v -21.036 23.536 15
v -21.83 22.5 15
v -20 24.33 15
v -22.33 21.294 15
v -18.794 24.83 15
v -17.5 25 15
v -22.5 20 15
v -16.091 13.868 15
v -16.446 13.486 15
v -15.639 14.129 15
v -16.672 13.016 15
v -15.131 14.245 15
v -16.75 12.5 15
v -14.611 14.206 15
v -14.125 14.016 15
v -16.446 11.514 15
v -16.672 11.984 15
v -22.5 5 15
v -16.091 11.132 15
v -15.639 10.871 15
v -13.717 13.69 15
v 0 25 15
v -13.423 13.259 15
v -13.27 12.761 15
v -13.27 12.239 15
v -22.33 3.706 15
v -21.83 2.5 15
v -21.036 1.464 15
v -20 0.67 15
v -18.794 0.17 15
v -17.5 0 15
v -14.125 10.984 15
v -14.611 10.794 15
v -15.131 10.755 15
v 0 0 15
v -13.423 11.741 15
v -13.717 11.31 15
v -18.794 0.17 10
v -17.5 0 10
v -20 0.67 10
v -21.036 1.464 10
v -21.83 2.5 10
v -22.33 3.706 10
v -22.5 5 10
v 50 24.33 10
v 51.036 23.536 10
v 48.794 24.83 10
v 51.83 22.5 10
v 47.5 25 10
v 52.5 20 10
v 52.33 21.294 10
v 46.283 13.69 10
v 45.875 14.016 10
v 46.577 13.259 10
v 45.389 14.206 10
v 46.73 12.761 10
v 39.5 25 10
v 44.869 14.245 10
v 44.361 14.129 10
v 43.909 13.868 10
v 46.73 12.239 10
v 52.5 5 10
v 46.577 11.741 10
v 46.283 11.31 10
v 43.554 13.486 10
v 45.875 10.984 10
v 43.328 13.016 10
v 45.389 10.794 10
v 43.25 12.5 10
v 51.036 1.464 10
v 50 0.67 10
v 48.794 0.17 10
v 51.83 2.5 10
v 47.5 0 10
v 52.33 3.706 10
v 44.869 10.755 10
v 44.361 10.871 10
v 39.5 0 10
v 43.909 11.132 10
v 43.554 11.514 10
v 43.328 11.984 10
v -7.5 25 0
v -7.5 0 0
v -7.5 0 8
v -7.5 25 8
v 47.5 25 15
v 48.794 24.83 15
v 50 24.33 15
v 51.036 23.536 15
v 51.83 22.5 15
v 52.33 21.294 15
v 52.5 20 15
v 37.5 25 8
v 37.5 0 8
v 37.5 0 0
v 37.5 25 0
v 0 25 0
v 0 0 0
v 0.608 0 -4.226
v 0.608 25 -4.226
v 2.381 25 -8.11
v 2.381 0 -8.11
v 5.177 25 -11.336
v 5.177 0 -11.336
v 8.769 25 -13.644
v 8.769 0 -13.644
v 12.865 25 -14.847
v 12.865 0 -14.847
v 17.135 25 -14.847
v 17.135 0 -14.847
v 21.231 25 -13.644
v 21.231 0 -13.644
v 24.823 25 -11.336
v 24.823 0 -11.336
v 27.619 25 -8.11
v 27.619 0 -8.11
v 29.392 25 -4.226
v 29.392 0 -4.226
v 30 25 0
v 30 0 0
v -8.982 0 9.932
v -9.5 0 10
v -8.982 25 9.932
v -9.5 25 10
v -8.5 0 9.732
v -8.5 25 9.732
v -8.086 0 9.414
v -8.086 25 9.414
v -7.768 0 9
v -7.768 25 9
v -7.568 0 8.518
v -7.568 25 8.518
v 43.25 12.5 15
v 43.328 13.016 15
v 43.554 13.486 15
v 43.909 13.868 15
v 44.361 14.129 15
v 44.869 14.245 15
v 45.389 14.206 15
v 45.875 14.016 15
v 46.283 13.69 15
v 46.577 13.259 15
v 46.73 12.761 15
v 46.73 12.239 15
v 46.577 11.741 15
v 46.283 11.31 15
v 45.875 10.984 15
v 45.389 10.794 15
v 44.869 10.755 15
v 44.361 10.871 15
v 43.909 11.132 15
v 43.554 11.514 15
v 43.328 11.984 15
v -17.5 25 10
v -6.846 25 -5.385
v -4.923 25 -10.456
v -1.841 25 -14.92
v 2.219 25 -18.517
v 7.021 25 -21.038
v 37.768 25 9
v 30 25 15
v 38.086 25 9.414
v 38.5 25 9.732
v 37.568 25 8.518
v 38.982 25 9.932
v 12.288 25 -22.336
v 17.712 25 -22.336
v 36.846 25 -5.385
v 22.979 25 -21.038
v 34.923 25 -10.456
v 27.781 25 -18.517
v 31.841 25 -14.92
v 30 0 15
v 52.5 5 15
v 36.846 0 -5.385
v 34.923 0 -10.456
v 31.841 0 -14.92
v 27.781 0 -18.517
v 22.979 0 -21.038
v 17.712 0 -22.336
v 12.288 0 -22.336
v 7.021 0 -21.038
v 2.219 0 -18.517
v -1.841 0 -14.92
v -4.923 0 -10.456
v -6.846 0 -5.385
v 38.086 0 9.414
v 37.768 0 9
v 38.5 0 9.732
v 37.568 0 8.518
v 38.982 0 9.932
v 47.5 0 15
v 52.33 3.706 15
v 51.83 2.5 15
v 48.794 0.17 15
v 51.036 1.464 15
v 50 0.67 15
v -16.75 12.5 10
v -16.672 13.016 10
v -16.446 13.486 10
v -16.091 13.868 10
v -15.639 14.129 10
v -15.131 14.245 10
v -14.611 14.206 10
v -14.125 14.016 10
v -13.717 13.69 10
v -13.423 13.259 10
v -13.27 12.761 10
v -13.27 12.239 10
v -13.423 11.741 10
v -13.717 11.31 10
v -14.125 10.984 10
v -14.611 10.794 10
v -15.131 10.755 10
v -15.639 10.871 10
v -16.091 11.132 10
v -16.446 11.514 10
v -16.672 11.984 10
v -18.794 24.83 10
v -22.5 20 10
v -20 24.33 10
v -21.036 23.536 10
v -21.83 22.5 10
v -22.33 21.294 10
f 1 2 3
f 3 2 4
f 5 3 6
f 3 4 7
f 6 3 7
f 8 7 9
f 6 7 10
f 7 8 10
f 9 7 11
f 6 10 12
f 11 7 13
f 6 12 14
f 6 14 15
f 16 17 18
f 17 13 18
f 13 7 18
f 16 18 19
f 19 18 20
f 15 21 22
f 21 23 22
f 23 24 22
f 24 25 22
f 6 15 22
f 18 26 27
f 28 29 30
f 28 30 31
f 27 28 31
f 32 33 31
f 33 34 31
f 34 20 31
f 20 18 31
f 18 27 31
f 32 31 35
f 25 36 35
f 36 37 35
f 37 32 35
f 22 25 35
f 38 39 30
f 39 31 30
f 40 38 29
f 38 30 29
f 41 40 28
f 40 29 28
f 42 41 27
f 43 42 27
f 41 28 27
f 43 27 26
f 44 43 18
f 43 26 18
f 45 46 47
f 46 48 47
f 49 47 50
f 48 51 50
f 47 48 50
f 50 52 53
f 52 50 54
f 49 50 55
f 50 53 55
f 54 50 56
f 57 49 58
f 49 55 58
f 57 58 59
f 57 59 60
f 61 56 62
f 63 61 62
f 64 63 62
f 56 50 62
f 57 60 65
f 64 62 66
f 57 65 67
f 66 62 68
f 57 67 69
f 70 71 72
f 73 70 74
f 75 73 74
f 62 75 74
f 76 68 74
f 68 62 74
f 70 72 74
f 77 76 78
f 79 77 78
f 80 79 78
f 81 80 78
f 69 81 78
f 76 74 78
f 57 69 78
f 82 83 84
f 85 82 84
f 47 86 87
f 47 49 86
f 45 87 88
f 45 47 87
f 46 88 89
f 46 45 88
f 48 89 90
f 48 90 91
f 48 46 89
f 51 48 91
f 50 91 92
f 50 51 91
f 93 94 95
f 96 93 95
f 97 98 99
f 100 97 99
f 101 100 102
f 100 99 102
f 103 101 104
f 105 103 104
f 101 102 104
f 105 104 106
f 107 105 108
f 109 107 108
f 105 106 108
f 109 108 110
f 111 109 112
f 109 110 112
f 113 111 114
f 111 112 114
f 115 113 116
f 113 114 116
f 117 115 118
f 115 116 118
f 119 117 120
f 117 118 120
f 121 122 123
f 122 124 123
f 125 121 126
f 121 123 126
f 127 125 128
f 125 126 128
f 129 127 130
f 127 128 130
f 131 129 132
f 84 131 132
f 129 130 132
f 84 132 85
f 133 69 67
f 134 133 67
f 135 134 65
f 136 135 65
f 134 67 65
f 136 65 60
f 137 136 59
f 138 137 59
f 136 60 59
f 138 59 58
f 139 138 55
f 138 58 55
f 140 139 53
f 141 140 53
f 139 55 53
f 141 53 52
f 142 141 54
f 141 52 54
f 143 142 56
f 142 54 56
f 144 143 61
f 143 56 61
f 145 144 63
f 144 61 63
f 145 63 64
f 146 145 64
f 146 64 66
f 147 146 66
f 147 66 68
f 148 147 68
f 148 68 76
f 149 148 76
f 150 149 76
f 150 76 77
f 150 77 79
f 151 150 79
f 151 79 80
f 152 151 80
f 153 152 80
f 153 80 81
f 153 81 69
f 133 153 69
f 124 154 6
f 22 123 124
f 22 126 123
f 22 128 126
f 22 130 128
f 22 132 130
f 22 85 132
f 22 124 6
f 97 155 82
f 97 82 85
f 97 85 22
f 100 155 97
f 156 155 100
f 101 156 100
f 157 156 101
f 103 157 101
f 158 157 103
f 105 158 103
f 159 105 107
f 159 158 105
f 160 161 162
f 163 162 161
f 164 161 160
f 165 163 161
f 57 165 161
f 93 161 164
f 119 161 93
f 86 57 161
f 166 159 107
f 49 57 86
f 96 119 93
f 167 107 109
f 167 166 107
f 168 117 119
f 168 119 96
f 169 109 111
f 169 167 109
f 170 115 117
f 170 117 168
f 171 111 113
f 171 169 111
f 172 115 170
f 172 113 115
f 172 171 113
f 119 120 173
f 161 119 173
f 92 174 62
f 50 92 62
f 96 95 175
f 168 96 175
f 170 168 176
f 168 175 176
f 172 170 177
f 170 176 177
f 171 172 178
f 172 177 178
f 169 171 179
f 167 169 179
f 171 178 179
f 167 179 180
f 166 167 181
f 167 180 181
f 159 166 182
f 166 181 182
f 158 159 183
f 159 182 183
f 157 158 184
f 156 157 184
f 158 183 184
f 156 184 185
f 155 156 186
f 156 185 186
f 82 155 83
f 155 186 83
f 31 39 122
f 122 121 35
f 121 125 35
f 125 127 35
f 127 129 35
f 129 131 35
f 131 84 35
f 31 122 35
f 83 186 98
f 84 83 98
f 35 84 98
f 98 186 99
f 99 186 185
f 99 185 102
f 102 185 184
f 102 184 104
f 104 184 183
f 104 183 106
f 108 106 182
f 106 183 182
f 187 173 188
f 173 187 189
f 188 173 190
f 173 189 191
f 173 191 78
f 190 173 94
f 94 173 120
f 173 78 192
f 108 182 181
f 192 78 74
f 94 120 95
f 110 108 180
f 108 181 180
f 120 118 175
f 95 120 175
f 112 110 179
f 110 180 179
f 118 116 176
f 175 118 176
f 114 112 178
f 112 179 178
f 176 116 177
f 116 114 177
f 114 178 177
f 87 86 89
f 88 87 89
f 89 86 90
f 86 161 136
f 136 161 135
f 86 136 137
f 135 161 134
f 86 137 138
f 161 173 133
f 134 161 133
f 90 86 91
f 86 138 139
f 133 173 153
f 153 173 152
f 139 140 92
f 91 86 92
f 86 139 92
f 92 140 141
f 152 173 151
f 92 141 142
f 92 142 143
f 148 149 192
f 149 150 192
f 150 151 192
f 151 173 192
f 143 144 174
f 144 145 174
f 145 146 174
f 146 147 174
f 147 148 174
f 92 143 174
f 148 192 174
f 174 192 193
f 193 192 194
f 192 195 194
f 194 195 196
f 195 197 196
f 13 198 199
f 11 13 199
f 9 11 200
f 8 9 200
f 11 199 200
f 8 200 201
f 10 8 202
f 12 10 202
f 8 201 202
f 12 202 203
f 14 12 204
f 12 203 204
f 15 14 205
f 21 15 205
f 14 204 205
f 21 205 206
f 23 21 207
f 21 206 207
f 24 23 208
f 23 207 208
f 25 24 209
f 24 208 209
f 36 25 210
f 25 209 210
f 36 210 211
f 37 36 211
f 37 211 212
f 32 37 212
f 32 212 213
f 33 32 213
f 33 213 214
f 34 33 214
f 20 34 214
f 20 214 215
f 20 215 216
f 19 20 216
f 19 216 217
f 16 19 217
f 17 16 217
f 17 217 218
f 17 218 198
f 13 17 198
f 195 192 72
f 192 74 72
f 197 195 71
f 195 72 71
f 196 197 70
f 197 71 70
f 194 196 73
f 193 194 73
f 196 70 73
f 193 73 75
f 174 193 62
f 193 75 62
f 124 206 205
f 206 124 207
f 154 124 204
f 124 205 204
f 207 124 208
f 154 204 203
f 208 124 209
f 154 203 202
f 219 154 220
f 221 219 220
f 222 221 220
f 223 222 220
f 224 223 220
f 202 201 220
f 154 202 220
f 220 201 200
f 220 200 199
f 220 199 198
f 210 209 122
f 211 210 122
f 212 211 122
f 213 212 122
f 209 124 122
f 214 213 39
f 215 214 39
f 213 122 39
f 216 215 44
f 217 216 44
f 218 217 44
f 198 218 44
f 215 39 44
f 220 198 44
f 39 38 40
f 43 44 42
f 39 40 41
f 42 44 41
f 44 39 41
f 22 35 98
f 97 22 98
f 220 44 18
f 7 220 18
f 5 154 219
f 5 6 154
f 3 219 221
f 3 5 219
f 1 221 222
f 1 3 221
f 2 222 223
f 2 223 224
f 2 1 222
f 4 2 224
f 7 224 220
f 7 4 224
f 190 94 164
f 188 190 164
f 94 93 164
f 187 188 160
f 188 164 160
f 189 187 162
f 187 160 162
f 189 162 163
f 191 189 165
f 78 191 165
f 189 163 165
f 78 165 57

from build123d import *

# Parameters (mm, degrees)
BOSS_EXTRUDE1_DEPTH = 25
SKETCH4_R           = 1.75
CUT_EXTRUDE1_DEPTH  = 6
FILLET1_R           = 5
FILLET2_R           = 2


with BuildPart() as part:
    # Sketch1 → Boss-Extrude1 (new body)
    with BuildSketch(Plane(origin=(0, 0, 0), x_dir=(1, 0, 0), z_dir=(0, 1, 0))):
        with BuildLine():
            Line((-7.5, 0), (-7.5, -10))
            Line((-7.5, -10), (-22.5, -10))
            Line((-22.5, -10), (-22.5, -15))
            Line((-22.5, -15), (0, -15))
            Line((0, -15), (0, 0))
            ThreePointArc((0, 0), (15, 15), (30, 0))
            Line((30, 0), (30, -15))
            Line((30, -15), (52.5, -15))
            Line((52.5, -15), (52.5, -10))
            Line((52.5, -10), (37.5, -10))
            Line((37.5, -10), (37.5, 0))
            ThreePointArc((37.5, 0), (15, 22.5), (-7.5, 0))
        make_face()
    extrude(amount=BOSS_EXTRUDE1_DEPTH)

    # Sketch4 → Cut-Extrude1 (cut, through all)
    with BuildSketch(Plane(origin=(0, 0, 10), x_dir=(-1, 0, 0), z_dir=(0, 0, -1))):
        with Locations((-45, 12.5)):
            Circle(SKETCH4_R)
        with Locations((15, 12.5)):
            Circle(SKETCH4_R)
    extrude(amount=-CUT_EXTRUDE1_DEPTH, mode=Mode.SUBTRACT)

    # Fillet1
    fillet1_edges = [part.edges().sort_by_distance(p)[0] for p in [
        (-22.5, 0, 12.5),
        (52.5, 0, 12.5),
        (52.5, 25, 12.5),
        (-22.5, 25, 12.5),
    ]]
    fillet(fillet1_edges, radius=FILLET1_R)

    # Fillet2
    fillet2_edges = [part.edges().sort_by_distance(p)[0] for p in [
        (-7.5, 12.5, 10),
        (37.5, 12.5, 10),
    ]]
    fillet(fillet2_edges, radius=FILLET2_R)


solid = part.part
